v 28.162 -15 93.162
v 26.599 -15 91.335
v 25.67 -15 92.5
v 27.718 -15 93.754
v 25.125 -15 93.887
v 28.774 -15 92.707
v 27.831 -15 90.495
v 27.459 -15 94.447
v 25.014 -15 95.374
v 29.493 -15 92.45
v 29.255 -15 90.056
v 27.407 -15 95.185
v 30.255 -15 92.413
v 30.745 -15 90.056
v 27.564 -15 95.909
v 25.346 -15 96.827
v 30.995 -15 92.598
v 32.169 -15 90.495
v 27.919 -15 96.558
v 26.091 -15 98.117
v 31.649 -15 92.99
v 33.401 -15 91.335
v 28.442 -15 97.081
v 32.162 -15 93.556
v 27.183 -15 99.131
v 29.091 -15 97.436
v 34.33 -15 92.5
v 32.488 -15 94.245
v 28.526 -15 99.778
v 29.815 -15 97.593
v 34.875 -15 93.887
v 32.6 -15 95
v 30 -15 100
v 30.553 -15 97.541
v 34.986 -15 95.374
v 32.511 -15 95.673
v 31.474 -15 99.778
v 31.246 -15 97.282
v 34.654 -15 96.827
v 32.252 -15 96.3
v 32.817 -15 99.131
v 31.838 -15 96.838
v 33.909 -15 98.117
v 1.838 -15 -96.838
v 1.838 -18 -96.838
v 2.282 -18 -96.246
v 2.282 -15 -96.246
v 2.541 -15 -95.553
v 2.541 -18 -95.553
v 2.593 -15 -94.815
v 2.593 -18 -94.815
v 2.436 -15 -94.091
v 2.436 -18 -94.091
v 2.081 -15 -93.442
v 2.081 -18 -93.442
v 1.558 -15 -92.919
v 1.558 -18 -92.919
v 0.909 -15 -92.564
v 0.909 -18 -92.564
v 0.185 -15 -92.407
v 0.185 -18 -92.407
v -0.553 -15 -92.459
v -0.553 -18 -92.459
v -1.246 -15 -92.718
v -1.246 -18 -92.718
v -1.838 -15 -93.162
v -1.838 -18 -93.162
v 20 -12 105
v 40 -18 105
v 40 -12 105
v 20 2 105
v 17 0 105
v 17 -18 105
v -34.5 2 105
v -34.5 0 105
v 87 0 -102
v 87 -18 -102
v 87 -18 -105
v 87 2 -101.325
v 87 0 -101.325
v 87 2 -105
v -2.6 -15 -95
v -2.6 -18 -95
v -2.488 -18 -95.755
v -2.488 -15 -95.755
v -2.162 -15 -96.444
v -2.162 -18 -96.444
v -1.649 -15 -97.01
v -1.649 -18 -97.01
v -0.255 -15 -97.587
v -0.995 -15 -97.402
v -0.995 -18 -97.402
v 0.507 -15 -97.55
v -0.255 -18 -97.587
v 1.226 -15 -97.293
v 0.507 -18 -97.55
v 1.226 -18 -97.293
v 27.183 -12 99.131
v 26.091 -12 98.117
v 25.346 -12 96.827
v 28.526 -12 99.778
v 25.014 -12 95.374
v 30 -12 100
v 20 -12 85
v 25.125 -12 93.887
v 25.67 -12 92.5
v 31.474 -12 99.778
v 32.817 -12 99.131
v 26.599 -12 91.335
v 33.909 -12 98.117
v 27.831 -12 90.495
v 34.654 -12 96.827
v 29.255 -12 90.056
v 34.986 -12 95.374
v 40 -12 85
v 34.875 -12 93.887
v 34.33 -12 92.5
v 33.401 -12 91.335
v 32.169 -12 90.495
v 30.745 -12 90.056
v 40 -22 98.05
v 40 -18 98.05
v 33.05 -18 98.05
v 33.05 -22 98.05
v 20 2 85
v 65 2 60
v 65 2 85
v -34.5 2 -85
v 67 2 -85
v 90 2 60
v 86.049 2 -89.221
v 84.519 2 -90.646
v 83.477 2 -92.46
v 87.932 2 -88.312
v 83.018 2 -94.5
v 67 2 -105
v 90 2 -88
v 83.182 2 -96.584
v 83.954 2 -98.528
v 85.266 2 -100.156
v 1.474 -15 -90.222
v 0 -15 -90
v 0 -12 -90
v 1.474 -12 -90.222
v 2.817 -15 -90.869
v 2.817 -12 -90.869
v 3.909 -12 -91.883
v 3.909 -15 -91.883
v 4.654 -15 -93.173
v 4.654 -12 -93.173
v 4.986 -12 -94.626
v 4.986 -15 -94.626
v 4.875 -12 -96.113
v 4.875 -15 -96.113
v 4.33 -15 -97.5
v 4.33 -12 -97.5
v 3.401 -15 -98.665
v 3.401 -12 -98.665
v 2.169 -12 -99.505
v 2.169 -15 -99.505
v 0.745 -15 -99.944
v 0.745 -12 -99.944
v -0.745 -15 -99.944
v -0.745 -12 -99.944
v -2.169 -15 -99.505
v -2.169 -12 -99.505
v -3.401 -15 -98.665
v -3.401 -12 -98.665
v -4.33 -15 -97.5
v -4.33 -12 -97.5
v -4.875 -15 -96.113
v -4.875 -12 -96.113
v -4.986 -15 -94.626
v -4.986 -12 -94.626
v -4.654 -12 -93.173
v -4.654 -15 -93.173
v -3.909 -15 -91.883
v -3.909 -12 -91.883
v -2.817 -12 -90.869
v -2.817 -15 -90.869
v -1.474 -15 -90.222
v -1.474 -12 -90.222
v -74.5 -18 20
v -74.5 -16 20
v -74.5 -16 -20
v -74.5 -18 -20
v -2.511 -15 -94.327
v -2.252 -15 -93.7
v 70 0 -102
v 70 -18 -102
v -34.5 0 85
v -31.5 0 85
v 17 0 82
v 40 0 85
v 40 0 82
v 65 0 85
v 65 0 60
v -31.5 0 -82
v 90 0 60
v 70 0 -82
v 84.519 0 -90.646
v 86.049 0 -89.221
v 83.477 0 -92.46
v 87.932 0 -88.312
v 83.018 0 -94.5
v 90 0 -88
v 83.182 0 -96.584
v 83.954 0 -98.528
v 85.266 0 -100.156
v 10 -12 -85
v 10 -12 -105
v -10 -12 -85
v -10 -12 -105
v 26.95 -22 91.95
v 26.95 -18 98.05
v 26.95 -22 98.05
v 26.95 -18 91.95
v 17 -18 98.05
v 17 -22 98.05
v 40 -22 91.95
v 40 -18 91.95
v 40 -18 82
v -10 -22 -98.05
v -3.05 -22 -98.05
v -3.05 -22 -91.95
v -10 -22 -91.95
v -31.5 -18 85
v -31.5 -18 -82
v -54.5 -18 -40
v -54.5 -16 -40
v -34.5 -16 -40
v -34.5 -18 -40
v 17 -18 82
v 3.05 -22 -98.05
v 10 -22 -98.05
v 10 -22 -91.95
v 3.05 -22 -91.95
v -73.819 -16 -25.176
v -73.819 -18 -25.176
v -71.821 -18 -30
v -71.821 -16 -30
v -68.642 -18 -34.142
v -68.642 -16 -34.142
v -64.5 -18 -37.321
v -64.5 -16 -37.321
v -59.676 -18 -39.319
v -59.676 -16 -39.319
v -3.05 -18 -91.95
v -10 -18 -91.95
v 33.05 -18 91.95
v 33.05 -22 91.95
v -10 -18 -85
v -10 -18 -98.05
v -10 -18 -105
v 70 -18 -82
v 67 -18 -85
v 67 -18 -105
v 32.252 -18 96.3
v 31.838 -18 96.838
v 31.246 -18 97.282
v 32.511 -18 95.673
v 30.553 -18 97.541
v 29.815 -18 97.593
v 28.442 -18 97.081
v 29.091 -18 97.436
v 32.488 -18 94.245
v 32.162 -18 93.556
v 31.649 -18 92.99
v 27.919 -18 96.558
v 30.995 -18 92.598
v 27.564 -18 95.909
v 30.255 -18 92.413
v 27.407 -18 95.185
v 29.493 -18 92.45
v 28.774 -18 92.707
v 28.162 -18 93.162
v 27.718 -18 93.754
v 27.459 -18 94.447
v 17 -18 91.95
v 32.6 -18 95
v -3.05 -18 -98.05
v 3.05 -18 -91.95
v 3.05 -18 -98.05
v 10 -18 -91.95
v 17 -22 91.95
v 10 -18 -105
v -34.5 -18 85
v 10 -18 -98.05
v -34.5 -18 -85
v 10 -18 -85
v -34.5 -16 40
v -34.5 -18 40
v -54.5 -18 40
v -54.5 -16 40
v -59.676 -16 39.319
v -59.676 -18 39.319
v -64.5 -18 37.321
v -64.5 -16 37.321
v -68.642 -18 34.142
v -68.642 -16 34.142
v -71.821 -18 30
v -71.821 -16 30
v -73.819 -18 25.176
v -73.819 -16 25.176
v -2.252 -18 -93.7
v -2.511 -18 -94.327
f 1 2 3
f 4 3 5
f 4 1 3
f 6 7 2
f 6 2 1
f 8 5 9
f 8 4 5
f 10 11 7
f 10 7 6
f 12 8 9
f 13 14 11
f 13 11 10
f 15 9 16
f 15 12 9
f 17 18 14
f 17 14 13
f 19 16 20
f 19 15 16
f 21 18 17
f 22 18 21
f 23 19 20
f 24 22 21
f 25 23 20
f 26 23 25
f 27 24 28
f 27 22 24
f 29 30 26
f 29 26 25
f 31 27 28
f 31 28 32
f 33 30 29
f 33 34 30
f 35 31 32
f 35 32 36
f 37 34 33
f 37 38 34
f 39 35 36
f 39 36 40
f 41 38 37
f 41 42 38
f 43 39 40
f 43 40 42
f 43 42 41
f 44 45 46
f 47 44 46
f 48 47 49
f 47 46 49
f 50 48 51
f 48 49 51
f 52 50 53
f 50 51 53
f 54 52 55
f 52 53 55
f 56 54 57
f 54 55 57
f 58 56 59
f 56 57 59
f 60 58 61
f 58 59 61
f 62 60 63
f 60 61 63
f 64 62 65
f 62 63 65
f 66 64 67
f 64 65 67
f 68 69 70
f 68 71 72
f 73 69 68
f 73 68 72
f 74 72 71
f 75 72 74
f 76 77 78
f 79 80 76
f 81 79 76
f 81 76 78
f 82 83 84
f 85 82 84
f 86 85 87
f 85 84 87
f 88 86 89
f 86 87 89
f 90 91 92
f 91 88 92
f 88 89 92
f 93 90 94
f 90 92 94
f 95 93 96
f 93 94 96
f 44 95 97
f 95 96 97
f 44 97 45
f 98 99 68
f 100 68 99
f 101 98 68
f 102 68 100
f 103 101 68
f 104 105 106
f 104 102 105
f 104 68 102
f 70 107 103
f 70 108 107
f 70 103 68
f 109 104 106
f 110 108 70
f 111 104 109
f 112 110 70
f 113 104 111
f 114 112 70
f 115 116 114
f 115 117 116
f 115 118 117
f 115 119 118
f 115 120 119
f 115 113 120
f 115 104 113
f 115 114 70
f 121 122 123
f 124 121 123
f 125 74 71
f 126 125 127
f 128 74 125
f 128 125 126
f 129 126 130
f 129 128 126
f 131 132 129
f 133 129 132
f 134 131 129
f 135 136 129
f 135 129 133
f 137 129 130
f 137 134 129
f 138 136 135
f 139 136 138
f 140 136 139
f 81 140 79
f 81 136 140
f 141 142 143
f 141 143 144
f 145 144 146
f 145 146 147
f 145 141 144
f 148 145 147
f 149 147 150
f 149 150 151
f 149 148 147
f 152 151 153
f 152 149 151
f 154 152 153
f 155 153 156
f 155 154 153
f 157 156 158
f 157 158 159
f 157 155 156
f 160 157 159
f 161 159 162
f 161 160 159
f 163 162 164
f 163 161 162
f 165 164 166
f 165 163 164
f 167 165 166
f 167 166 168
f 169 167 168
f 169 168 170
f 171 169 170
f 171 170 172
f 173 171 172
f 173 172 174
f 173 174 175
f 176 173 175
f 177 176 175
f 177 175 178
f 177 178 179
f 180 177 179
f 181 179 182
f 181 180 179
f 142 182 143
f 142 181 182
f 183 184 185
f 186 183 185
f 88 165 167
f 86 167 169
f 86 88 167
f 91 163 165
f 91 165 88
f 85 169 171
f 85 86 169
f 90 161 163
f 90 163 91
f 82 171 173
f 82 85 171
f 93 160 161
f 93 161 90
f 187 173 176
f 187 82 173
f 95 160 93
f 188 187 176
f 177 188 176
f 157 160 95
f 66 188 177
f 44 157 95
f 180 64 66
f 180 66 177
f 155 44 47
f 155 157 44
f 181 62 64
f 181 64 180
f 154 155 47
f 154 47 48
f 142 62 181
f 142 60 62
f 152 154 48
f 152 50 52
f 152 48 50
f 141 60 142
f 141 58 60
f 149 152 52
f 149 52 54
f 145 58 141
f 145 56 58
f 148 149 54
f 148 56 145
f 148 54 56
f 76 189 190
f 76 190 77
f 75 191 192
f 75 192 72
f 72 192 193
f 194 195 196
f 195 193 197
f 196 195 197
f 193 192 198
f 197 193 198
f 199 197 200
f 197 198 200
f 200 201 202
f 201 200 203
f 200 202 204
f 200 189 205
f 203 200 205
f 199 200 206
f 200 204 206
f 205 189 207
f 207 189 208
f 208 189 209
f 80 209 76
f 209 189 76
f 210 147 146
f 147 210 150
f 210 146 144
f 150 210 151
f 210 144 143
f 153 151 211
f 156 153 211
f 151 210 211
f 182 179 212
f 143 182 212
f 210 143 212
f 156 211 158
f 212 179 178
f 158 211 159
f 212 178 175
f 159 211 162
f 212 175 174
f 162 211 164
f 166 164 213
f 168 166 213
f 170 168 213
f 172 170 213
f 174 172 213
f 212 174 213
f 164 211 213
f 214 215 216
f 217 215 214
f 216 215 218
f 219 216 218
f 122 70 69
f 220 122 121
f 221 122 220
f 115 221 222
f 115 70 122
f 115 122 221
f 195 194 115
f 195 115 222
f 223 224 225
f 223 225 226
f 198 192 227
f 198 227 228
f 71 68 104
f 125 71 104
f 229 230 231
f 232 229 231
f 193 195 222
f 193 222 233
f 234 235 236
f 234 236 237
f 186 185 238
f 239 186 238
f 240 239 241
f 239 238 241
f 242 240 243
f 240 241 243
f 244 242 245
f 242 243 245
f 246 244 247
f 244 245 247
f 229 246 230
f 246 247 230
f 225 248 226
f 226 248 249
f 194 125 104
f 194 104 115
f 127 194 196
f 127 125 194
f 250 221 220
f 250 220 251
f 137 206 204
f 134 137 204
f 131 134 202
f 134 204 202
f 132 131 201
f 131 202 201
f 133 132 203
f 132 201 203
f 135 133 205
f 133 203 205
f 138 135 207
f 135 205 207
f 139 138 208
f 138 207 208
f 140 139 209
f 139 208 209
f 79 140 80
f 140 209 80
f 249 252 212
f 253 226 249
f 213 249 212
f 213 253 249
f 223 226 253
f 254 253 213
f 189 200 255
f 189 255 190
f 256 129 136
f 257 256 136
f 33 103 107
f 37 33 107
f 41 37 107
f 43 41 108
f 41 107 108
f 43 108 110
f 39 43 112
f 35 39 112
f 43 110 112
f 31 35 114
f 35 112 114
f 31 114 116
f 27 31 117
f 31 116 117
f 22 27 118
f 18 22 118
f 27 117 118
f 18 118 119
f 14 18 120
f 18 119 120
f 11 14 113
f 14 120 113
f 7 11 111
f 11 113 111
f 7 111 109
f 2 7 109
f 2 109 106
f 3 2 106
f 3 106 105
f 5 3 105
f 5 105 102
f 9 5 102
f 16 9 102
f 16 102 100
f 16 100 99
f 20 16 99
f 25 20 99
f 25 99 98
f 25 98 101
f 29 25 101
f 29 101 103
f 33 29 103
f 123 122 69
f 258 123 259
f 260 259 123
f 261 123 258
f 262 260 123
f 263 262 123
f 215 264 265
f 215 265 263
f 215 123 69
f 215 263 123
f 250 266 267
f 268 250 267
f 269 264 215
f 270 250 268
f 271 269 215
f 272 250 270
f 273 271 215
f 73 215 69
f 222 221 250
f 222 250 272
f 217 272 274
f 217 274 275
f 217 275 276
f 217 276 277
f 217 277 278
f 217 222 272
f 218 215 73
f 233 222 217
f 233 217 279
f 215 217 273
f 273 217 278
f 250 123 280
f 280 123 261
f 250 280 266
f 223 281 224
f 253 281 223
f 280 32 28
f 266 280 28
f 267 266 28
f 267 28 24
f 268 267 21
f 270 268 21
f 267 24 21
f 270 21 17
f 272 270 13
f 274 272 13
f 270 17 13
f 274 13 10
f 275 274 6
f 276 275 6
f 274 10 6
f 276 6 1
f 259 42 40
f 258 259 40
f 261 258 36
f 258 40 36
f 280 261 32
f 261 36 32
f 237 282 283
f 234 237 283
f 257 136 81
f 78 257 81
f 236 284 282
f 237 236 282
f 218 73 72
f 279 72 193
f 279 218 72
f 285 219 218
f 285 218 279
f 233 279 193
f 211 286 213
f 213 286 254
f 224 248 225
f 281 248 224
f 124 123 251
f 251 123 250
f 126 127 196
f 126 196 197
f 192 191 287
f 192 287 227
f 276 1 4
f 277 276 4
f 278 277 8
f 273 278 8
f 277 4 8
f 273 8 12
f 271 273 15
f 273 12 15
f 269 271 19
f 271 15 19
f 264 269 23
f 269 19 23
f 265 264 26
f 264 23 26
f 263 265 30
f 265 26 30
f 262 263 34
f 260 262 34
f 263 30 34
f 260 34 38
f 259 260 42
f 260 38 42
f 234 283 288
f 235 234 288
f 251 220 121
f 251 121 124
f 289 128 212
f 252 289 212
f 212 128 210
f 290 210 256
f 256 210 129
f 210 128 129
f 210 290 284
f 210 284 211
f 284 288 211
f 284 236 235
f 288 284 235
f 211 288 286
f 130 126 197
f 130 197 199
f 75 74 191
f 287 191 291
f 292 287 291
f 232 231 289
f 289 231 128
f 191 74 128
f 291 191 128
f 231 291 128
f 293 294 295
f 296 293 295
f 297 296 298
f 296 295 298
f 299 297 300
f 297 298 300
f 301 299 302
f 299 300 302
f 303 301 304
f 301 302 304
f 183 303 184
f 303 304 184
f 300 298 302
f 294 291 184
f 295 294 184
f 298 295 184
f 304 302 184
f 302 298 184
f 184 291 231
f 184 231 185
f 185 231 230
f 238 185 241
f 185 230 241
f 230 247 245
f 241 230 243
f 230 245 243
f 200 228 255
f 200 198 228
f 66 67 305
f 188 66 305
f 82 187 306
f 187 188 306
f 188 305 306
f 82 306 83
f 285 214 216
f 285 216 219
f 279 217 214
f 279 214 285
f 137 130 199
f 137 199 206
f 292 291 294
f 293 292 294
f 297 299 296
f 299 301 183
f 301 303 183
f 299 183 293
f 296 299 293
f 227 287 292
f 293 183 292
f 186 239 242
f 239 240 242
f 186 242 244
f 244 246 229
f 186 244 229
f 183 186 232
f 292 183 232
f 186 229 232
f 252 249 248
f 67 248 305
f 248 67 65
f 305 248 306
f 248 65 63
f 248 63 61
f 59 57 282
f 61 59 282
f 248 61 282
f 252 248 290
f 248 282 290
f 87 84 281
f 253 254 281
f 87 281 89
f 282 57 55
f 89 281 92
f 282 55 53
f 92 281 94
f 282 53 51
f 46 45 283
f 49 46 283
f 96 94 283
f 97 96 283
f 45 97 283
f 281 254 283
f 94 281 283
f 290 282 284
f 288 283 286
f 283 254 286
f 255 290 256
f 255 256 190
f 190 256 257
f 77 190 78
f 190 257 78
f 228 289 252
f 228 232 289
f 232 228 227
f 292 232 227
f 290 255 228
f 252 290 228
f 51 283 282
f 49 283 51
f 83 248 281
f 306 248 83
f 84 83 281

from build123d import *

# Parameters (mm, degrees)
SKETCH_1_W           = 180
SKETCH_1_H           = 170
EXTRUDE_1_DEPTH      = 2
SKETCH_2_W           = 180
SKETCH_2_H           = 2
SKETCH_2_W_2         = 2
SKETCH_2_H_2         = 166
EXTRUDE_2_DEPTH      = 18
SKETCH_4_W           = 20
SKETCH_4_H           = 20
EXTRUDE_3_DEPTH      = 20
SKETCH_5_W           = 20
SKETCH_5_H           = 20
CUT_EXTRUDE_1_DEPTH  = 14
SKETCH_6_W           = 176
SKETCH_6_H           = 166
SKETCH_6_W_2         = 174
SKETCH_6_H_2         = 164
EXTRUDE_4_DEPTH      = 18
SKETCH_7_W           = 20
SKETCH_7_H           = 20
EXTRUDE_5_DEPTH      = 6
SKETCH_8_W           = 3
SKETCH_8_H           = 164
SKETCH_8_H_2         = 3
CUT_EXTRUDE_2_DEPTH  = 18
SKETCH_9_W           = 77
SKETCH_9_H           = 3
CUT_EXTRUDE_3_DEPTH  = 18
SKETCH_10_W          = 25
SKETCH_10_H          = 25
CUT_EXTRUDE_4_DEPTH  = 18
SKETCH_11_W          = 6.95
SKETCH_11_H          = 6.1
EXTRUDE_6_DEPTH      = 4
CUT_EXTRUDE_5_DEPTH  = 6
CUT_EXTRUDE_START    = -3
SKETCH_13_R          = 5
SKETCH_13_R_2        = 2.6
CUT_EXTRUDE_6_DEPTH  = 3
CUT_EXTRUDE_7_DEPTH  = 3
SKETCH_15_R          = 2.6
CUT_EXTRUDE_8_DEPTH  = 3
SKETCH_16_W          = 6.1
SKETCH_16_H          = 6.95
EXTRUDE_7_DEPTH      = 4
CUT_EXTRUDE_9_DEPTH  = 6
SKETCH_18_R          = 5
SKETCH_18_R_2        = 2.6
CUT_EXTRUDE_10_DEPTH = 3
EXTRUDE_8_DEPTH      = 4
SKETCH_20_W          = 30
SKETCH_20_H          = 20
SKETCH_20_W_2        = 80
EXTRUDE_9_DEPTH      = 2
SKETCH_21_W          = 3
SKETCH_21_H          = 20
EXTRUDE_10_DEPTH     = 18
SKETCH_22_W          = 20
SKETCH_22_H          = 20
SKETCH_22_R          = 5
EXTRUDE_11_DEPTH     = 14
SKETCH_23_W          = 30
SKETCH_23_H          = 20
CUT_EXTRUDE_11_DEPTH = 14
SKETCH_24_W          = 20
SKETCH_24_H          = 20
EXTRUDE_12_DEPTH     = 2
SKETCH_25_W          = 20
SKETCH_25_H          = 3
CUT_EXTRUDE_12_DEPTH = 18
CUT_EXTRUDE_13_DEPTH = 18
SKETCH_27_W          = 3
SKETCH_27_H          = 20
EXTRUDE_13_DEPTH     = 20
SKETCH_28_W          = 23
SKETCH_28_H          = 3
EXTRUDE_14_DEPTH     = 20
SKETCH_29_W          = 3
SKETCH_29_H          = 5
CUT_EXTRUDE_14_DEPTH = 20
SKETCH_30_W          = 20
SKETCH_30_H          = 20
CUT_EXTRUDE_15_DEPTH = 30
SKETCH_31_W          = 3
SKETCH_31_H          = 190
EXTRUDE_15_DEPTH     = 20
EXTRUDE_START        = -2
EXTRUDE_16_DEPTH     = 2
SKETCH_33_W          = 40
SKETCH_33_H          = 80
CUT_EXTRUDE_16_DEPTH = 2
SKETCH_34_W          = 44.5
SKETCH_34_H          = 20
CUT_EXTRUDE_17_DEPTH = 30
SKETCH_35_W          = 20
SKETCH_35_H          = 3
CUT_EXTRUDE_18_DEPTH = 18
EXTRUDE_17_DEPTH     = 20
CUT_EXTRUDE_19_DEPTH = 20
SKETCH_38_R          = 5
CUT_EXTRUDE_20_DEPTH = 17
SKETCH_39_W          = 20
SKETCH_39_H          = 20
CUT_EXTRUDE_21_DEPTH = 14
SKETCH_40_W          = 54.5
SKETCH_40_H          = 20
EXTRUDE_18_DEPTH     = 2
SKETCH_42_W          = 3
SKETCH_42_H          = 23
EXTRUDE_20_DEPTH     = 18
SKETCH_44_W          = 9.95
SKETCH_44_H          = 6.1
SKETCH_44_W_2        = 6.95
EXTRUDE_21_DEPTH     = 4


with BuildPart() as part:
    # 草图1 → 凸台-拉伸1 (new body)
    with BuildSketch(Plane(origin=(0, 0, 0), x_dir=(1, 0, 0), z_dir=(0, 1, 0))):
        Rectangle(SKETCH_1_W, SKETCH_1_H)
    extrude(amount=EXTRUDE_1_DEPTH)

    # 草图2 → 凸台-拉伸2 (add)
    with BuildSketch(Plane(origin=(0, 0, 0), x_dir=(1, 0, 0), z_dir=(0, 1, 0))):
        with Locations((0, 84)):
            Rectangle(SKETCH_2_W, SKETCH_2_H)
        Polygon((-88, 83), (-90, 83), (-90, -85), (-88, -85), (-88, -83), align=None)
        with Locations((89, 0)):
            Rectangle(SKETCH_2_W_2, SKETCH_2_H_2)
        Polygon((90, -85), (90, -83), (88, -83), (-88, -83), (-88, -85), align=None)
    extrude(amount=-EXTRUDE_2_DEPTH)

    # 草图4 → 凸台-拉伸3 (add)
    with BuildSketch(Plane(origin=(0, 2, 0), x_dir=(1, 0, 0), z_dir=(0, 1, 0))):
        Polygon((10, -85), (0, -85), (-10, -85), (-10, -95), (-10, -105), (10, -105), (10, -95), align=None)
        with Locations((-100, 0)):
            Rectangle(SKETCH_4_W, SKETCH_4_H)
    extrude(amount=-EXTRUDE_3_DEPTH)

    # 草图5 → 切除-拉伸1 (cut)
    with BuildSketch(Plane(origin=(0, 2, 0), x_dir=(1, 0, 0), z_dir=(0, 1, 0))):
        with Locations((-100, 0)):
            Rectangle(SKETCH_5_W, SKETCH_5_H)
        with Locations((0, -95)):
            Rectangle(SKETCH_5_W, SKETCH_5_H)
    extrude(amount=-CUT_EXTRUDE_1_DEPTH, mode=Mode.SUBTRACT)

    # 草图6 → 凸台-拉伸4 (add)
    with BuildSketch(Plane.XZ):
        Rectangle(SKETCH_6_W, SKETCH_6_H)
        Rectangle(SKETCH_6_W_2, SKETCH_6_H_2, mode=Mode.SUBTRACT)
    extrude(amount=EXTRUDE_4_DEPTH)

    # 草图7 → 凸台-拉伸5 (add)
    with BuildSketch(Plane(origin=(0, -18, 0), x_dir=(-1, 0, 0), z_dir=(0, -1, 0))):
        with Locations((0, 95)):
            Rectangle(SKETCH_7_W, SKETCH_7_H)
    extrude(amount=-EXTRUDE_5_DEPTH)

    # 草图8 → 切除-拉伸2 (cut)
    with BuildSketch(Plane(origin=(0, -18, 0), x_dir=(-1, 0, 0), z_dir=(0, -1, 0))):
        with Locations((-88.5, 0)):
            Rectangle(SKETCH_8_W, SKETCH_8_H)
        with Locations((-88.5, -83.5)):
            Rectangle(SKETCH_8_W, SKETCH_8_H_2)
    extrude(amount=-CUT_EXTRUDE_2_DEPTH, mode=Mode.SUBTRACT)

    # 草图9 → 切除-拉伸3 (cut)
    with BuildSketch(Plane(origin=(0, -18, 0), x_dir=(-1, 0, 0), z_dir=(0, -1, 0))):
        with Locations((-48.5, -83.5)):
            Rectangle(SKETCH_9_W, SKETCH_9_H)
        with Locations((48.5, -83.5)):
            Rectangle(SKETCH_9_W, SKETCH_9_H)
    extrude(amount=-CUT_EXTRUDE_3_DEPTH, mode=Mode.SUBTRACT)

    # 草图10 → 切除-拉伸4 (cut)
    with BuildSketch(Plane(origin=(0, 2, 0), x_dir=(1, 0, 0), z_dir=(0, 1, 0))):
        with Locations((77.5, -72.5)):
            Rectangle(SKETCH_10_W, SKETCH_10_H)
    extrude(amount=-CUT_EXTRUDE_4_DEPTH, mode=Mode.SUBTRACT)

    # 草图11 → 凸台-拉伸6 (add)
    with BuildSketch(Plane(origin=(0, -18, 0), x_dir=(-1, 0, 0), z_dir=(0, -1, 0))):
        Polygon((-3.05, 91.95), (-3.05, 98.05), (-10, 98.05), (-10, 95), (-10, 91.95), align=None)
        with Locations((6.525, 95)):
            Rectangle(SKETCH_11_W, SKETCH_11_H)
    extrude(amount=EXTRUDE_6_DEPTH)

    # 草图12 → 切除-拉伸5 (cut)
    with BuildSketch(Plane(origin=(0, -18, 0), x_dir=(-1, 0, 0), z_dir=(0, -1, 0))):
        with BuildLine():
            ThreePointArc((-1.838477631, 96.838477631), (-1.838477631, 93.161522369), (1.838477631, 93.161522369))
            Line((1.838477631, 93.161522369), (-1.838477631, 96.838477631))
        make_face()
        with BuildLine():
            Line((-1.838477631, 96.838477631), (1.838477631, 93.161522369))
            ThreePointArc((1.838477631, 93.161522369), (2.402086785, 94.005023076), (2.6, 95))
            ThreePointArc((2.6, 95), (0.994976924, 97.402086785), (-1.838477631, 96.838477631))
        make_face()
    extrude(amount=-CUT_EXTRUDE_5_DEPTH, mode=Mode.SUBTRACT)

    # 草图13 → 切除-拉伸6 (cut)
    with BuildSketch(Plane(origin=(0, -12, 0), x_dir=(1, 0, 0), z_dir=(0, 1, 0)).offset(CUT_EXTRUDE_START)):
        with Locations(Location((0, 95, 0), (0, 0, 270))):
            Circle(SKETCH_13_R)
        with Locations(Location((0, 95, 0), (0, 0, 90))):
            Circle(SKETCH_13_R_2, mode=Mode.SUBTRACT)
    extrude(amount=CUT_EXTRUDE_6_DEPTH, mode=Mode.SUBTRACT)

    # 草图14 → 切除-拉伸7 (cut)
    with BuildSketch(Plane(origin=(0, -12, 0), x_dir=(1, 0, 0), z_dir=(0, 1, 0))):
        with BuildLine():
            ThreePointArc((-96.464466094, 3.535533906), (-103.535533906, 3.535533906), (-103.535533906, -3.535533906))
            Line((-103.535533906, -3.535533906), (-96.464466094, 3.535533906))
        make_face()
        with BuildLine():
            Line((-96.464466094, 3.535533906), (-103.535533906, -3.535533906))
            ThreePointArc((-103.535533906, -3.535533906), (-98.086582838, -4.619397663), (-95, 0))
            ThreePointArc((-95, 0), (-95.380602337, 1.913417162), (-96.464466094, 3.535533906))
        make_face()
    extrude(amount=-CUT_EXTRUDE_7_DEPTH, mode=Mode.SUBTRACT)

    # 草图15 → 切除-拉伸8 (cut)
    with BuildSketch(Plane(origin=(0, -15, 0), x_dir=(1, 0, 0), z_dir=(0, 1, 0))):
        with Locations(Location((-100, 0, 0), (0, 0, 270))):
            Circle(SKETCH_15_R)
    extrude(amount=-CUT_EXTRUDE_8_DEPTH, mode=Mode.SUBTRACT)

    # 草图16 → 凸台-拉伸7 (add)
    with BuildSketch(Plane.XZ.offset(18)):
        Polygon((-96.95, -3.05), (-100, -3.05), (-103.05, -3.05), (-103.05, -10), (-96.95, -10), align=None)
        with Locations((-100, 6.525)):
            Rectangle(SKETCH_16_W, SKETCH_16_H)
    extrude(amount=EXTRUDE_7_DEPTH)

    # 草图17 → 切除-拉伸9 (cut)
    with BuildSketch(Plane(origin=(0, -18, 0), x_dir=(-1, 0, 0), z_dir=(0, -1, 0))):
        with BuildLine():
            ThreePointArc((2.6, -95), (0.994976924, -92.597913215), (-1.838477631, -93.161522369))
            Line((-1.838477631, -93.161522369), (1.838477631, -96.838477631))
            ThreePointArc((1.838477631, -96.838477631), (2.402086785, -95.994976924), (2.6, -95))
        make_face()
        with BuildLine():
            Line((1.838477631, -96.838477631), (-1.838477631, -93.161522369))
            ThreePointArc((-1.838477631, -93.161522369), (-1.838477631, -96.838477631), (1.838477631, -96.838477631))
        make_face()
    extrude(amount=-CUT_EXTRUDE_9_DEPTH, mode=Mode.SUBTRACT)

    # 草图18 → 切除-拉伸10 (cut)
    with BuildSketch(Plane(origin=(0, -12, 0), x_dir=(1, 0, 0), z_dir=(0, 1, 0)).offset(CUT_EXTRUDE_START)):
        with Locations(Location((0, -95, 0), (0, 0, 270))):
            Circle(SKETCH_18_R)
        with Locations(Location((0, -95, 0), (0, 0, 90))):
            Circle(SKETCH_18_R_2, mode=Mode.SUBTRACT)
    extrude(amount=CUT_EXTRUDE_10_DEPTH, mode=Mode.SUBTRACT)

    # 草图19 → 凸台-拉伸8 (add)
    with BuildSketch(Plane(origin=(0, -18, 0), x_dir=(-1, 0, 0), z_dir=(0, -1, 0))):
        Polygon((3.05, -91.95), (3.05, -95), (3.05, -98.05), (10, -98.05), (10, -91.95), align=None)
        Polygon((-3.05, -98.05), (-3.05, -95), (-3.05, -91.95), (-10, -91.95), (-10, -98.05), align=None)
    extrude(amount=EXTRUDE_8_DEPTH)

    # 草图20 → 凸台-拉伸9 (add)
    with BuildSketch(Plane(origin=(0, 2, 0), x_dir=(1, 0, 0), z_dir=(0, 1, 0))):
        with Locations((25, -95)):
            Rectangle(SKETCH_20_W, SKETCH_20_H)
        with Locations((-50, -95)):
            Rectangle(SKETCH_20_W_2, SKETCH_20_H)
    extrude(amount=-EXTRUDE_9_DEPTH)

    # 草图21 → 凸台-拉伸10 (add)
    with BuildSketch(Plane(origin=(0, 0, 0), x_dir=(-1, 0, 0), z_dir=(0, -1, 0))):
        with Locations((88.5, -95)):
            Rectangle(SKETCH_21_W, SKETCH_21_H)
    extrude(amount=EXTRUDE_10_DEPTH)

    # 草图22 → 凸台-拉伸11 (add)
    with BuildSketch(Plane(origin=(0, -12, 0), x_dir=(1, 0, 0), z_dir=(0, 1, 0))):
        with Locations((0, -95)):
            Rectangle(SKETCH_22_W, SKETCH_22_H)
        with Locations(Location((0, -95, 0), (0, 0, 270))):
            Circle(SKETCH_22_R, mode=Mode.SUBTRACT)
    extrude(amount=EXTRUDE_11_DEPTH)

    # 草图23 → 切除-拉伸11 (cut)
    with BuildSketch(Plane(origin=(0, 0, 0), x_dir=(-1, 0, 0), z_dir=(0, -1, 0))):
        with Locations((-25, -95)):
            Rectangle(SKETCH_23_W, SKETCH_23_H)
    extrude(amount=-CUT_EXTRUDE_11_DEPTH, mode=Mode.SUBTRACT)

    # 草图24 → 凸台-拉伸12 (add)
    with BuildSketch(Plane(origin=(0, 2, 0), x_dir=(1, 0, 0), z_dir=(0, 1, 0))):
        with Locations((80, 95)):
            Rectangle(SKETCH_24_W, SKETCH_24_H)
    extrude(amount=-EXTRUDE_12_DEPTH)

    # 草图25 → 切除-拉伸12 (cut)
    with BuildSketch(Plane(origin=(0, -18, 0), x_dir=(-1, 0, 0), z_dir=(0, -1, 0))):
        with Locations((-80, 83.5)):
            Rectangle(SKETCH_25_W, SKETCH_25_H)
    extrude(amount=-CUT_EXTRUDE_12_DEPTH, mode=Mode.SUBTRACT)

    # 草图26 → 切除-拉伸13 (cut)
    with BuildSketch(Plane.XZ):
        with BuildLine():
            ThreePointArc((90, -88), (83, -95), (90, -102))
            Line((90, -102), (90, -95))
            Line((90, -95), (90, -88))
        make_face()
    extrude(amount=-CUT_EXTRUDE_13_DEPTH, mode=Mode.SUBTRACT)

    # 草图27 → 凸台-拉伸13 (add)
    with BuildSketch(Plane(origin=(0, 2, 0), x_dir=(1, 0, 0), z_dir=(0, 1, 0))):
        with Locations((68.5, 95)):
            Rectangle(SKETCH_27_W, SKETCH_27_H)
    extrude(amount=-EXTRUDE_13_DEPTH)

    # 草图28 → 凸台-拉伸14 (add)
    with BuildSketch(Plane(origin=(0, 2, 0), x_dir=(1, 0, 0), z_dir=(0, 1, 0))):
        with Locations((78.5, 103.5)):
            Rectangle(SKETCH_28_W, SKETCH_28_H)
    extrude(amount=-EXTRUDE_14_DEPTH)

    # 草图29 → 切除-拉伸14 (cut)
    with BuildSketch(Plane(origin=(0, 2, 0), x_dir=(1, 0, 0), z_dir=(0, 1, 0))):
        with Locations((88.5, 102.5)):
            Rectangle(SKETCH_29_W, SKETCH_29_H)
    extrude(amount=-CUT_EXTRUDE_14_DEPTH, mode=Mode.SUBTRACT)

    # 草图30 → 切除-拉伸15 (cut)
    with BuildSketch(Plane(origin=(0, 2, 0), x_dir=(1, 0, 0), z_dir=(0, 1, 0))):
        with BuildLine():
            Line((-34.5, 40), (-34.5, 85))
            Line((-34.5, 85), (-90, 85))
            Line((-90, 85), (-90, 10))
            Line((-90, 10), (-90, -10))
            Line((-90, -10), (-90, -105))
            Line((-90, -105), (-34.5, -105))
            Line((-34.5, -105), (-34.5, -85))
            Line((-34.5, -85), (-34.5, -40))
            Line((-34.5, -40), (-54.5, -40))
            ThreePointArc((-54.5, -40), (-68.642135624, -34.142135624), (-74.5, -20))
            Line((-74.5, -20), (-74.5, 20))
            ThreePointArc((-74.5, 20), (-68.642135624, 34.142135624), (-54.5, 40))
            Line((-54.5, 40), (-34.5, 40))
        make_face()
        with Locations((-100, 0)):
            Rectangle(SKETCH_30_W, SKETCH_30_H)
    extrude(amount=-CUT_EXTRUDE_15_DEPTH, mode=Mode.SUBTRACT)

    # 草图31 → 凸台-拉伸15 (add)
    with BuildSketch(Plane(origin=(0, 2, 0), x_dir=(1, 0, 0), z_dir=(0, 1, 0))):
        with Locations((-33, -10)):
            Rectangle(SKETCH_31_W, SKETCH_31_H)
    extrude(amount=-EXTRUDE_15_DEPTH)

    # 草图32 → 凸台-拉伸16 (add)
    with BuildSketch(Plane(origin=(0, -18, 0), x_dir=(-1, 0, 0), z_dir=(0, -1, 0)).offset(EXTRUDE_START)):
        with BuildLine():
            Line((34.5, -40), (54.5, -40))
            ThreePointArc((54.5, -40), (68.642135624, -34.142135624), (74.5, -20))
            Line((74.5, -20), (74.5, 20))
            ThreePointArc((74.5, 20), (68.642135624, 34.142135624), (54.5, 40))
            Line((54.5, 40), (34.5, 40))
            Line((34.5, 40), (34.5, -40))
        make_face()
    extrude(amount=EXTRUDE_16_DEPTH)

    # 草图33 → 切除-拉伸16 (cut)
    with BuildSketch(Plane(origin=(0, 2, 0), x_dir=(1, 0, 0), z_dir=(0, 1, 0))):
        with Locations((-54.5, 0)):
            Rectangle(SKETCH_33_W, SKETCH_33_H)
    extrude(amount=-CUT_EXTRUDE_16_DEPTH, mode=Mode.SUBTRACT)

    # 草图34 → 切除-拉伸17 (cut)
    with BuildSketch(Plane(origin=(0, 2, 0), x_dir=(1, 0, 0), z_dir=(0, 1, 0))):
        with Locations((-12.25, -95)):
            Rectangle(SKETCH_34_W, SKETCH_34_H)
    extrude(amount=-CUT_EXTRUDE_17_DEPTH, mode=Mode.SUBTRACT)

    # 草图35 → 切除-拉伸18 (cut)
    with BuildSketch(Plane(origin=(0, -18, 0), x_dir=(-1, 0, 0), z_dir=(0, -1, 0))):
        with Locations((0, -83.5)):
            Rectangle(SKETCH_35_W, SKETCH_35_H)
    extrude(amount=-CUT_EXTRUDE_18_DEPTH, mode=Mode.SUBTRACT)

    # 草图36 → 凸台-拉伸17 (add)
    with BuildSketch(Plane(origin=(0, 2, 0), x_dir=(1, 0, 0), z_dir=(0, 1, 0))):
        Polygon((40, -105), (40, -85), (40, -82), (20, -82), (20, -85), (20, -105), align=None)
    extrude(amount=-EXTRUDE_17_DEPTH)

    # 草图37 → 切除-拉伸19 (cut)
    with BuildSketch(Plane(origin=(0, 2, 0), x_dir=(1, 0, 0), z_dir=(0, 1, 0))):
        with BuildLine():
            ThreePointArc((32.6, -95), (30.994976924, -92.597913215), (28.161522369, -93.161522369))
            Line((28.161522369, -93.161522369), (31.838477631, -96.838477631))
            ThreePointArc((31.838477631, -96.838477631), (32.402086785, -95.994976924), (32.6, -95))
        make_face()
        with BuildLine():
            Line((31.838477631, -96.838477631), (28.161522369, -93.161522369))
            ThreePointArc((28.161522369, -93.161522369), (28.161522369, -96.838477631), (31.838477631, -96.838477631))
        make_face()
    extrude(amount=-CUT_EXTRUDE_19_DEPTH, mode=Mode.SUBTRACT)

    # 草图38 → 切除-拉伸20 (cut)
    with BuildSketch(Plane(origin=(0, 2, 0), x_dir=(1, 0, 0), z_dir=(0, 1, 0))):
        with Locations(Location((30, -95, 0), (0, 0, 270))):
            Circle(SKETCH_38_R)
    extrude(amount=-CUT_EXTRUDE_20_DEPTH, mode=Mode.SUBTRACT)

    # 草图39 → 切除-拉伸21 (cut)
    with BuildSketch(Plane(origin=(0, 2, 0), x_dir=(1, 0, 0), z_dir=(0, 1, 0))):
        with Locations((30, -95)):
            Rectangle(SKETCH_39_W, SKETCH_39_H)
    extrude(amount=-CUT_EXTRUDE_21_DEPTH, mode=Mode.SUBTRACT)

    # 草图40 → 凸台-拉伸18 (add)
    with BuildSketch(Plane(origin=(0, 2, 0), x_dir=(1, 0, 0), z_dir=(0, 1, 0))):
        with Locations((-7.25, -95)):
            Rectangle(SKETCH_40_W, SKETCH_40_H)
    extrude(amount=-EXTRUDE_18_DEPTH)

    # 草图42 → 凸台-拉伸20 (add)
    with BuildSketch(Plane(origin=(0, -18, 0), x_dir=(-1, 0, 0), z_dir=(0, -1, 0))):
        with Locations((-18.5, -93.5)):
            Rectangle(SKETCH_42_W, SKETCH_42_H)
    extrude(amount=-EXTRUDE_20_DEPTH)

    # 草图44 → 凸台-拉伸21 (add)
    with BuildSketch(Plane(origin=(0, -18, 0), x_dir=(-1, 0, 0), z_dir=(0, -1, 0))):
        with Locations((-21.975, -95)):
            Rectangle(SKETCH_44_W, SKETCH_44_H)
        with Locations((-36.525, -95)):
            Rectangle(SKETCH_44_W_2, SKETCH_44_H)
    extrude(amount=EXTRUDE_21_DEPTH)


solid = part.part
